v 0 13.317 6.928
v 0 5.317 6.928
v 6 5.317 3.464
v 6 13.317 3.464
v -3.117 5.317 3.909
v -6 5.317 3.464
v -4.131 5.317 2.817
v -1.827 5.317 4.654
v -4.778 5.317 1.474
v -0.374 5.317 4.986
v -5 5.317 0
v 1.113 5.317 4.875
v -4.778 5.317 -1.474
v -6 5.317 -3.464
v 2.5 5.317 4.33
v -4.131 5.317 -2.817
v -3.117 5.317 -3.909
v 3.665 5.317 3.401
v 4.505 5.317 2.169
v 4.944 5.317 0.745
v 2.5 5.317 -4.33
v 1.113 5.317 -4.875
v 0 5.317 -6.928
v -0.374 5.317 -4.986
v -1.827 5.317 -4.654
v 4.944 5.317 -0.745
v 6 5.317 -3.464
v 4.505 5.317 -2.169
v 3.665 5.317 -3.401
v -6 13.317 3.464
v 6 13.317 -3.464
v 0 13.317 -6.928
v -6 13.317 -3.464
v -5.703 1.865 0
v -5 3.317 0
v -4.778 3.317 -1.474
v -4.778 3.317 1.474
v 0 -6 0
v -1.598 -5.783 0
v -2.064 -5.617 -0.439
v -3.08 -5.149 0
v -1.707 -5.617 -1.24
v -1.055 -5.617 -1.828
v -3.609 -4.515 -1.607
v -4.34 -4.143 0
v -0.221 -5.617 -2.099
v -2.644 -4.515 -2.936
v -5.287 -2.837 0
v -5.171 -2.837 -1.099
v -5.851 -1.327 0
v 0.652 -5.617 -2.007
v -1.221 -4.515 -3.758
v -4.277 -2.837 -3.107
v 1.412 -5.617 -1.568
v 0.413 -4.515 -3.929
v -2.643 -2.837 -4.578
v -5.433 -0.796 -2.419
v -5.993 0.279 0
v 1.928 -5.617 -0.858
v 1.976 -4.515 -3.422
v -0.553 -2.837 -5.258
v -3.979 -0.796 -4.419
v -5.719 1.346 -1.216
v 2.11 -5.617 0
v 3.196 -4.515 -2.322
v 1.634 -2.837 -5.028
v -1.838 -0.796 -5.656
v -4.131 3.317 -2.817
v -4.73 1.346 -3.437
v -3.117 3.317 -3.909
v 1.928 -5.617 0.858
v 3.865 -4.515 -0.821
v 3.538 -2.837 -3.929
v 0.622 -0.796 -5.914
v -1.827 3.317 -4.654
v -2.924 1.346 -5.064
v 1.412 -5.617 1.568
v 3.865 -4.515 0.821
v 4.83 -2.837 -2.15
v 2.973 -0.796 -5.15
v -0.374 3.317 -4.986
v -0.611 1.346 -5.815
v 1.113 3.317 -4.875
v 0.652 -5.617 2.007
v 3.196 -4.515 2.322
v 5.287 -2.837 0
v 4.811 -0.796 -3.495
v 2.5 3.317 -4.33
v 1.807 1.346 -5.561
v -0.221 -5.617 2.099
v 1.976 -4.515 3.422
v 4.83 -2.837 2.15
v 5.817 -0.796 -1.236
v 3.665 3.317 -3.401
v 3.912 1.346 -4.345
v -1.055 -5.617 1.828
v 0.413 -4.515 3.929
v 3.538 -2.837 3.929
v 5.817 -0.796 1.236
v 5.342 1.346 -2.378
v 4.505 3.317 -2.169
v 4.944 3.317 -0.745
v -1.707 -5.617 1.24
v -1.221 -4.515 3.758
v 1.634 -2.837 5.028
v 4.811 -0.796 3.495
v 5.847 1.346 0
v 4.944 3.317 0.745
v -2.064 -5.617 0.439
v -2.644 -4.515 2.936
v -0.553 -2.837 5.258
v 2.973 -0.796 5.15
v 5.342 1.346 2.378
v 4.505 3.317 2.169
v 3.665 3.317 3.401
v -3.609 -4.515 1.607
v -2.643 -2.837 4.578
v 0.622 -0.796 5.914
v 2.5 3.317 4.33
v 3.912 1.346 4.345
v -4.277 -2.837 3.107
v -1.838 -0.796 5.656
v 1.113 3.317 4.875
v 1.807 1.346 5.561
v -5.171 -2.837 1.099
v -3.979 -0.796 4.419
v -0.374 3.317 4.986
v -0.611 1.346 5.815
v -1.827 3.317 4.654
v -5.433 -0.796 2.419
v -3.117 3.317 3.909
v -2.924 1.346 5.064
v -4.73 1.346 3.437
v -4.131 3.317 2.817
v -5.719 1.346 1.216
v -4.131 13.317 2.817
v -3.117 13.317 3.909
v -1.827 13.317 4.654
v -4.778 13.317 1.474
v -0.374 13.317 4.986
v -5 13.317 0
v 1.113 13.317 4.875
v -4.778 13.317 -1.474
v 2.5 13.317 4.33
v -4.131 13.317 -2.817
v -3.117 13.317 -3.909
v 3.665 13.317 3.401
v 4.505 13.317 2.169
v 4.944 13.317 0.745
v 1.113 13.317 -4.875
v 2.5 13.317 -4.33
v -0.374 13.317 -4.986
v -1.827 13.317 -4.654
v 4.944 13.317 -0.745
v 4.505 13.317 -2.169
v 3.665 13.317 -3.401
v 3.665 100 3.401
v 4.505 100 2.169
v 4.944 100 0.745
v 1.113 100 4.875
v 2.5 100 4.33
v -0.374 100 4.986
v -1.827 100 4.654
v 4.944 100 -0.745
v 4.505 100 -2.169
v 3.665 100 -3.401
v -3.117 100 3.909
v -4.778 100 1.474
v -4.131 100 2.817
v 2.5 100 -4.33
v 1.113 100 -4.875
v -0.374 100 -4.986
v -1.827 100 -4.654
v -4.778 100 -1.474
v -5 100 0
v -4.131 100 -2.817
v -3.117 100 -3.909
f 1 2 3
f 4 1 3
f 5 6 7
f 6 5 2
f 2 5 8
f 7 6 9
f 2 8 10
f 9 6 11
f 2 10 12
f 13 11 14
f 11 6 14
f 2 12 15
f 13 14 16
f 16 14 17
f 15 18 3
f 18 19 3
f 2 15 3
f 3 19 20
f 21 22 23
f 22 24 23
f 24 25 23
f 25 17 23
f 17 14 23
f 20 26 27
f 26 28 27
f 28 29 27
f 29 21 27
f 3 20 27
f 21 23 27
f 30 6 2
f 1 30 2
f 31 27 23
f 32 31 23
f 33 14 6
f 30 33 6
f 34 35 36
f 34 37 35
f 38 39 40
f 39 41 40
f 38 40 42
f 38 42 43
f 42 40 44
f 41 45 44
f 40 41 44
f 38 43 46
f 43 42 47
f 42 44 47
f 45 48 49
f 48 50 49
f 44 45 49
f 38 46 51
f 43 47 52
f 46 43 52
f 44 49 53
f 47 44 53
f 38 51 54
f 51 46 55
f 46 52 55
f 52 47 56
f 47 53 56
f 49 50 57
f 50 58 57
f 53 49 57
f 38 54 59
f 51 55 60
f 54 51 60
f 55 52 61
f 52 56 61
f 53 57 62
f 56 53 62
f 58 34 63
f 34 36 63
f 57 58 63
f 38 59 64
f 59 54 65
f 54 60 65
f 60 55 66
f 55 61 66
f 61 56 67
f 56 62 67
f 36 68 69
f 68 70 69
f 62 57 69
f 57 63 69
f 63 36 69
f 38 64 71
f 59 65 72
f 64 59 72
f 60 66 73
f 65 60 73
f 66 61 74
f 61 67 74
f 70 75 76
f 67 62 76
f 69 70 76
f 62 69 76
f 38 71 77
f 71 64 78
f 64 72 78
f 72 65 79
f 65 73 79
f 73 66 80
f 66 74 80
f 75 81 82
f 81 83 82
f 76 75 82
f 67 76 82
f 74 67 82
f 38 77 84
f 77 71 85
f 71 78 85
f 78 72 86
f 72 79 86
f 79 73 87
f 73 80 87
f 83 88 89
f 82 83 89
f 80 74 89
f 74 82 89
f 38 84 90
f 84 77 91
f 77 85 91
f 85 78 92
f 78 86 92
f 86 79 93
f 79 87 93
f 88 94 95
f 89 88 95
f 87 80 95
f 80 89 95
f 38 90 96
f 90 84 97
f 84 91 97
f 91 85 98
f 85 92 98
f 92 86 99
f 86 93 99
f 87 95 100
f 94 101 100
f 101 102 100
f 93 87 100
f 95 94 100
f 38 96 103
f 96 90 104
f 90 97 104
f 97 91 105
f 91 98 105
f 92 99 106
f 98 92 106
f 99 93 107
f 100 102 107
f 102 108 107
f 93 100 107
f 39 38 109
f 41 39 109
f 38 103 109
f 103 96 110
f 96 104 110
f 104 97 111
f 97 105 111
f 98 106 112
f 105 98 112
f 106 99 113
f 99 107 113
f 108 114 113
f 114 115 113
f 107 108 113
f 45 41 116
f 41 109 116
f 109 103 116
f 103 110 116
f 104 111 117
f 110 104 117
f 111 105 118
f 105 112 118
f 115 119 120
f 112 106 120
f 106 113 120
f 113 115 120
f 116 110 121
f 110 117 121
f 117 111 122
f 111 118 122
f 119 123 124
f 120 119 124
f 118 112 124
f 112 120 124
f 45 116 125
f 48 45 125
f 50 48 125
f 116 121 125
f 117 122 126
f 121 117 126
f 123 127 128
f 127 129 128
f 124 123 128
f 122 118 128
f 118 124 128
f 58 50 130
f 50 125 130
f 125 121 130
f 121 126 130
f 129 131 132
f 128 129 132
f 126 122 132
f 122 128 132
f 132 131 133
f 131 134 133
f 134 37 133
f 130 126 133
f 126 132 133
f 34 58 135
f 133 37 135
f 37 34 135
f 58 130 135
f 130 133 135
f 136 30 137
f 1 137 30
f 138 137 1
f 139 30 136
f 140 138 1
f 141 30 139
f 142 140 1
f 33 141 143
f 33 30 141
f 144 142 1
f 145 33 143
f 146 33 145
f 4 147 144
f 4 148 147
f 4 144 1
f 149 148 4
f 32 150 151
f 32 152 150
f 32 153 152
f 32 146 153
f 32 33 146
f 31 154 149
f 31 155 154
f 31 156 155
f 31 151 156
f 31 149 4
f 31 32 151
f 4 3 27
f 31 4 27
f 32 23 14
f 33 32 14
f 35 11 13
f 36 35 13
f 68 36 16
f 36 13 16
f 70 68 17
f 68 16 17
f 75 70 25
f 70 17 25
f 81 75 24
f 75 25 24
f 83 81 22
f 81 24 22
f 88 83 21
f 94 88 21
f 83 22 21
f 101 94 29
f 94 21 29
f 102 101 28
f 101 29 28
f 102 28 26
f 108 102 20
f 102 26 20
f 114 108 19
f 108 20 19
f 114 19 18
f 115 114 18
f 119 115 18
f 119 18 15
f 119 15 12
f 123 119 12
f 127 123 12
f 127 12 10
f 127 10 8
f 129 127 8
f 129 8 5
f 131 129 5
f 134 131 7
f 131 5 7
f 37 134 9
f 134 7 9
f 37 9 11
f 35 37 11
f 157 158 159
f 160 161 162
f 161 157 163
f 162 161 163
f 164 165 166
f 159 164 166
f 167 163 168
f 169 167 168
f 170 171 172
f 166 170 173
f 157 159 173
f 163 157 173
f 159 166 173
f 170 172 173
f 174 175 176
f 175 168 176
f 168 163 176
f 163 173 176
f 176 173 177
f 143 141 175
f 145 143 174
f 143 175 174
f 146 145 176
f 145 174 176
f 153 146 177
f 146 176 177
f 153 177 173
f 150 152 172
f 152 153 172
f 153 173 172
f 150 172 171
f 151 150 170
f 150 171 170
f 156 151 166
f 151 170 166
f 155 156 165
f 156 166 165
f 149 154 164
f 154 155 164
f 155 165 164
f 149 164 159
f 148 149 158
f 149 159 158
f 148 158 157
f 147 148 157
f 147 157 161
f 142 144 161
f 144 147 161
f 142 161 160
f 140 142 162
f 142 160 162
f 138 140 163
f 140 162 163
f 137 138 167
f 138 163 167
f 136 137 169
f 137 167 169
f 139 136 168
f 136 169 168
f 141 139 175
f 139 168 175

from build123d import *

# Parameters (mm, degrees)
BOSS_EXTRUDE3_DEPTH = 8


with BuildPart() as part:
    # Sketch1 → Revolve1 (revolve)
    with BuildSketch(Plane.XY):
        with BuildLine():
            Line((-5, 3.31662479), (-5, 100))
            Line((-5, 100), (0, 100))
            Line((0, 100), (0, -6))
            ThreePointArc((0, -6), (-5.286764074, -2.837274331), (-5, 3.31662479))
        make_face()
    revolve(axis=Axis((0, 109.494581108, 0), (0, -1, 0)))

    # Sketch4 → Boss-Extrude3 (add)
    with BuildSketch(Plane(origin=(0, 5.31662479, 0), x_dir=(1, 0, 0), z_dir=(0, 1, 0))):
        Polygon((0, 6.92820323), (-6, 3.464101615), (-6, -3.464101615), (0, -6.92820323), (6, -3.464101615), (6, 3.464101615), align=None)
    extrude(amount=BOSS_EXTRUDE3_DEPTH)


solid = part.part
